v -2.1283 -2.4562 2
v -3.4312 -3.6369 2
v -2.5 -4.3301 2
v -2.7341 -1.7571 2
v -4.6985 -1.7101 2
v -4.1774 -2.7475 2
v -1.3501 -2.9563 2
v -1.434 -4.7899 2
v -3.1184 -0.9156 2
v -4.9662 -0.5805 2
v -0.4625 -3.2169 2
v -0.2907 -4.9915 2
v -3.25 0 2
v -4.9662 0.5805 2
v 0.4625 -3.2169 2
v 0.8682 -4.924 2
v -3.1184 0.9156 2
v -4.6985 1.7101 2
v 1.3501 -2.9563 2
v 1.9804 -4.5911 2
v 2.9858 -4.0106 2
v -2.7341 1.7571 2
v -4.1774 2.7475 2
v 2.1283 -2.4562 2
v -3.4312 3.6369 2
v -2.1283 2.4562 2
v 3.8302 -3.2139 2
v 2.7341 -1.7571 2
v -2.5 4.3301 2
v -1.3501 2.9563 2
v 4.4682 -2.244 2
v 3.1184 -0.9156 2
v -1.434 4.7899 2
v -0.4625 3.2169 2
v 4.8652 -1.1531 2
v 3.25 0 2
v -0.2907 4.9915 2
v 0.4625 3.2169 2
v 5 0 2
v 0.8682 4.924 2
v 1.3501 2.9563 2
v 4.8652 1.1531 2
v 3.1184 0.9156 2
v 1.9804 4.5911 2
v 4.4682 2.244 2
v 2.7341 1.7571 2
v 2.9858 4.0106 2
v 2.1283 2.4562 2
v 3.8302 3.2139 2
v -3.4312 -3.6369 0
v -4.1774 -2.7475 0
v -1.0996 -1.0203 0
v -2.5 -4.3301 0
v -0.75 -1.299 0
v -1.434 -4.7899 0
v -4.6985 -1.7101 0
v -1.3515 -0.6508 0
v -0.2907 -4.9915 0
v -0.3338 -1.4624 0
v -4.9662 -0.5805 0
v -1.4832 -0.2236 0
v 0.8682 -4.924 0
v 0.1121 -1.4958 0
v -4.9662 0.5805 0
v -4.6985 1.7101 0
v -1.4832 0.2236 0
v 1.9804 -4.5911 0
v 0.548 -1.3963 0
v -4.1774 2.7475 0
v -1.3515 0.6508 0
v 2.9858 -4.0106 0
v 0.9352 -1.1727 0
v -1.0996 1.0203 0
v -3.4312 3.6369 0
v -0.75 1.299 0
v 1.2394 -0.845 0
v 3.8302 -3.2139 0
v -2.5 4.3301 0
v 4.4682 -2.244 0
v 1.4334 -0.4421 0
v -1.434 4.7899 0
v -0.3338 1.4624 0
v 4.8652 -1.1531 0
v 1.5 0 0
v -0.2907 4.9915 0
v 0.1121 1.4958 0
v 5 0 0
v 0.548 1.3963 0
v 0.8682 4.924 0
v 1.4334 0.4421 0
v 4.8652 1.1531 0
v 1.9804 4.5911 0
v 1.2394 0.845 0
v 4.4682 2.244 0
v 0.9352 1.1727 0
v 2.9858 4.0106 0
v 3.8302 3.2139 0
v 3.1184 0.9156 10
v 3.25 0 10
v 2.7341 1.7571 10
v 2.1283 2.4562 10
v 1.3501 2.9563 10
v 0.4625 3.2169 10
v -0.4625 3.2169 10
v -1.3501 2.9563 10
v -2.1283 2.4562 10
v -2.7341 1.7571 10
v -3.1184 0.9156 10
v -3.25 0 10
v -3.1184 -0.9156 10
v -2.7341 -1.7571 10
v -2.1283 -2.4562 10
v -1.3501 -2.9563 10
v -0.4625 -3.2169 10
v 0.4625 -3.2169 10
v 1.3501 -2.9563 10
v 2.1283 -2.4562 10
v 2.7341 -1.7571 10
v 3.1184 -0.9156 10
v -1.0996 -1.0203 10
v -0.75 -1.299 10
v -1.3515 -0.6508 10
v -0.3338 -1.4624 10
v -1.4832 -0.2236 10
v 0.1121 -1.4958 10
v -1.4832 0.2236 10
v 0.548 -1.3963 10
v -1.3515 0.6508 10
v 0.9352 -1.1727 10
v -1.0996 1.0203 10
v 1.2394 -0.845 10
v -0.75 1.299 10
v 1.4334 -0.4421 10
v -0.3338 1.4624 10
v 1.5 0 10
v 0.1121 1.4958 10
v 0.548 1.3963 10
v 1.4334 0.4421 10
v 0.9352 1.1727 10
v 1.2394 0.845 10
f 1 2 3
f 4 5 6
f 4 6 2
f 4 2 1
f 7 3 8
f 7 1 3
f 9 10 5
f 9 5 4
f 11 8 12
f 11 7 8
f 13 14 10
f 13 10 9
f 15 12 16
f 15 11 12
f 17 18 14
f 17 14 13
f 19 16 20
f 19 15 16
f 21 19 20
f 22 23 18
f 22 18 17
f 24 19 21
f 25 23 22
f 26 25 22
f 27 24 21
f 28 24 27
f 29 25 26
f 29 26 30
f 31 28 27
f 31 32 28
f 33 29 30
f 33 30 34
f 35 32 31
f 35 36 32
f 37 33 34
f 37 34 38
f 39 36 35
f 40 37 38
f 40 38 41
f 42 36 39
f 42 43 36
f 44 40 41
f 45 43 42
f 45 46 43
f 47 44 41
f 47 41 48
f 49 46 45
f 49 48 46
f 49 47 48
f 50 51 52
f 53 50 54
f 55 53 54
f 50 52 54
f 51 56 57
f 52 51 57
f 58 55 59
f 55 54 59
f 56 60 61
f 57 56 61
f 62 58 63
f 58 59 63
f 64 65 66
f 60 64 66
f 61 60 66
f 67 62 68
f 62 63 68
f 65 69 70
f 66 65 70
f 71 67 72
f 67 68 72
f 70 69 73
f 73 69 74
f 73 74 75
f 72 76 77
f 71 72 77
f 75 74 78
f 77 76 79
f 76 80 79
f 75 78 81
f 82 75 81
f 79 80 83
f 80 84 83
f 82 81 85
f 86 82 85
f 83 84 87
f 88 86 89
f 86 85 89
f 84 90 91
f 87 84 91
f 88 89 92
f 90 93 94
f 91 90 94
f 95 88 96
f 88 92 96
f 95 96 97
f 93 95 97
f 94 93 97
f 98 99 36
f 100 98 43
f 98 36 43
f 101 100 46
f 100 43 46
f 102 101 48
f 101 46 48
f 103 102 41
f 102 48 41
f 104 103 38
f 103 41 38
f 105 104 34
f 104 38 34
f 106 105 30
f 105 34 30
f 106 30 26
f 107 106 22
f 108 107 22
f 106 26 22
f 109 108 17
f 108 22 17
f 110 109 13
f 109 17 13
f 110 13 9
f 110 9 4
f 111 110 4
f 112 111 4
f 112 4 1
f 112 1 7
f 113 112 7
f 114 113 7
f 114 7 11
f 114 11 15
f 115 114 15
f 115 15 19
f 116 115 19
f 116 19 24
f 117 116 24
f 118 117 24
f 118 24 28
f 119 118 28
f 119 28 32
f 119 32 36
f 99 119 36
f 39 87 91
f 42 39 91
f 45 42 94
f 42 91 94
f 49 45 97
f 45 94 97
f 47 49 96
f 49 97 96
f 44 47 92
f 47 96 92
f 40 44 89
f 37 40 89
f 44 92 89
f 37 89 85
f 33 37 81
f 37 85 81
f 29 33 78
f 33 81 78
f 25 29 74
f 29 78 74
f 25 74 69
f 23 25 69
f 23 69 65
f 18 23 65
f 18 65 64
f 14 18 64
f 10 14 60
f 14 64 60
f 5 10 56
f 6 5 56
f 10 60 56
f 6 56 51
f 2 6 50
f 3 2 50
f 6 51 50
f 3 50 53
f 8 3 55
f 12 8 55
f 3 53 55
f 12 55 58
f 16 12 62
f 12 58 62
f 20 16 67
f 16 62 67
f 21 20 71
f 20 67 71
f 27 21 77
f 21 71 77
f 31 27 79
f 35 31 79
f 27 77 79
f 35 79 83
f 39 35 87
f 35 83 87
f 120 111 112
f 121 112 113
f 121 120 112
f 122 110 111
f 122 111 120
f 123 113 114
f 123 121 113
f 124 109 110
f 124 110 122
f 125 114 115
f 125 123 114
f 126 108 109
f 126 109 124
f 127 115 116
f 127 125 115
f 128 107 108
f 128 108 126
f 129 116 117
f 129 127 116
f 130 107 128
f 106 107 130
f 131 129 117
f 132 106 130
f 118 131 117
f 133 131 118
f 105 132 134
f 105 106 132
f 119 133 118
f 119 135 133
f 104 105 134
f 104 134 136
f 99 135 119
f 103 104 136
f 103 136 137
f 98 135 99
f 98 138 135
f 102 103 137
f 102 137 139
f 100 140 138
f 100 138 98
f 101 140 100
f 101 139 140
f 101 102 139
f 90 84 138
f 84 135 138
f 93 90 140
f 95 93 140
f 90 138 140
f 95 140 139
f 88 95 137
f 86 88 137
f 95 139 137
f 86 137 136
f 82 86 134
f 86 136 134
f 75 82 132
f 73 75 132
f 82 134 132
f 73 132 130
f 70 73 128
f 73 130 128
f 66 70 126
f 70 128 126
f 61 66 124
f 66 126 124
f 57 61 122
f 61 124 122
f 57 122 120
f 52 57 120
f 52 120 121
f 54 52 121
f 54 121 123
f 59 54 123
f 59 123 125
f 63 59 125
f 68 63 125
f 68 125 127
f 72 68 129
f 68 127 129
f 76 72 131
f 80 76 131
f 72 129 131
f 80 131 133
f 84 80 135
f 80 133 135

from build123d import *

# Parameters (mm, degrees)
F0_R      = 3.25
F0_R_2    = 1.5
F1_DEPTH  = 10
F2_R      = 5
F3_DEPTH  = 2
F3_FACE_R = 1.5
F4_DEPTH  = 25


with BuildPart() as f1:
    # F0 (on Top) → F1 (new body)
    with BuildSketch(Plane.XY):
        Circle(F0_R)
        Circle(F0_R_2, mode=Mode.SUBTRACT)
    extrude(amount=F1_DEPTH)

    # F2 (on Top) → F3 (join)
    with BuildSketch(Plane.XY):
        Circle(F2_R)
    extrude(amount=F3_DEPTH)

    # F3_face (on face) → F4 (cut)
    with BuildSketch(Plane.XY.offset(2)):
        Circle(F3_FACE_R)
    extrude(amount=-F4_DEPTH, mode=Mode.SUBTRACT)


solid = f1.part
